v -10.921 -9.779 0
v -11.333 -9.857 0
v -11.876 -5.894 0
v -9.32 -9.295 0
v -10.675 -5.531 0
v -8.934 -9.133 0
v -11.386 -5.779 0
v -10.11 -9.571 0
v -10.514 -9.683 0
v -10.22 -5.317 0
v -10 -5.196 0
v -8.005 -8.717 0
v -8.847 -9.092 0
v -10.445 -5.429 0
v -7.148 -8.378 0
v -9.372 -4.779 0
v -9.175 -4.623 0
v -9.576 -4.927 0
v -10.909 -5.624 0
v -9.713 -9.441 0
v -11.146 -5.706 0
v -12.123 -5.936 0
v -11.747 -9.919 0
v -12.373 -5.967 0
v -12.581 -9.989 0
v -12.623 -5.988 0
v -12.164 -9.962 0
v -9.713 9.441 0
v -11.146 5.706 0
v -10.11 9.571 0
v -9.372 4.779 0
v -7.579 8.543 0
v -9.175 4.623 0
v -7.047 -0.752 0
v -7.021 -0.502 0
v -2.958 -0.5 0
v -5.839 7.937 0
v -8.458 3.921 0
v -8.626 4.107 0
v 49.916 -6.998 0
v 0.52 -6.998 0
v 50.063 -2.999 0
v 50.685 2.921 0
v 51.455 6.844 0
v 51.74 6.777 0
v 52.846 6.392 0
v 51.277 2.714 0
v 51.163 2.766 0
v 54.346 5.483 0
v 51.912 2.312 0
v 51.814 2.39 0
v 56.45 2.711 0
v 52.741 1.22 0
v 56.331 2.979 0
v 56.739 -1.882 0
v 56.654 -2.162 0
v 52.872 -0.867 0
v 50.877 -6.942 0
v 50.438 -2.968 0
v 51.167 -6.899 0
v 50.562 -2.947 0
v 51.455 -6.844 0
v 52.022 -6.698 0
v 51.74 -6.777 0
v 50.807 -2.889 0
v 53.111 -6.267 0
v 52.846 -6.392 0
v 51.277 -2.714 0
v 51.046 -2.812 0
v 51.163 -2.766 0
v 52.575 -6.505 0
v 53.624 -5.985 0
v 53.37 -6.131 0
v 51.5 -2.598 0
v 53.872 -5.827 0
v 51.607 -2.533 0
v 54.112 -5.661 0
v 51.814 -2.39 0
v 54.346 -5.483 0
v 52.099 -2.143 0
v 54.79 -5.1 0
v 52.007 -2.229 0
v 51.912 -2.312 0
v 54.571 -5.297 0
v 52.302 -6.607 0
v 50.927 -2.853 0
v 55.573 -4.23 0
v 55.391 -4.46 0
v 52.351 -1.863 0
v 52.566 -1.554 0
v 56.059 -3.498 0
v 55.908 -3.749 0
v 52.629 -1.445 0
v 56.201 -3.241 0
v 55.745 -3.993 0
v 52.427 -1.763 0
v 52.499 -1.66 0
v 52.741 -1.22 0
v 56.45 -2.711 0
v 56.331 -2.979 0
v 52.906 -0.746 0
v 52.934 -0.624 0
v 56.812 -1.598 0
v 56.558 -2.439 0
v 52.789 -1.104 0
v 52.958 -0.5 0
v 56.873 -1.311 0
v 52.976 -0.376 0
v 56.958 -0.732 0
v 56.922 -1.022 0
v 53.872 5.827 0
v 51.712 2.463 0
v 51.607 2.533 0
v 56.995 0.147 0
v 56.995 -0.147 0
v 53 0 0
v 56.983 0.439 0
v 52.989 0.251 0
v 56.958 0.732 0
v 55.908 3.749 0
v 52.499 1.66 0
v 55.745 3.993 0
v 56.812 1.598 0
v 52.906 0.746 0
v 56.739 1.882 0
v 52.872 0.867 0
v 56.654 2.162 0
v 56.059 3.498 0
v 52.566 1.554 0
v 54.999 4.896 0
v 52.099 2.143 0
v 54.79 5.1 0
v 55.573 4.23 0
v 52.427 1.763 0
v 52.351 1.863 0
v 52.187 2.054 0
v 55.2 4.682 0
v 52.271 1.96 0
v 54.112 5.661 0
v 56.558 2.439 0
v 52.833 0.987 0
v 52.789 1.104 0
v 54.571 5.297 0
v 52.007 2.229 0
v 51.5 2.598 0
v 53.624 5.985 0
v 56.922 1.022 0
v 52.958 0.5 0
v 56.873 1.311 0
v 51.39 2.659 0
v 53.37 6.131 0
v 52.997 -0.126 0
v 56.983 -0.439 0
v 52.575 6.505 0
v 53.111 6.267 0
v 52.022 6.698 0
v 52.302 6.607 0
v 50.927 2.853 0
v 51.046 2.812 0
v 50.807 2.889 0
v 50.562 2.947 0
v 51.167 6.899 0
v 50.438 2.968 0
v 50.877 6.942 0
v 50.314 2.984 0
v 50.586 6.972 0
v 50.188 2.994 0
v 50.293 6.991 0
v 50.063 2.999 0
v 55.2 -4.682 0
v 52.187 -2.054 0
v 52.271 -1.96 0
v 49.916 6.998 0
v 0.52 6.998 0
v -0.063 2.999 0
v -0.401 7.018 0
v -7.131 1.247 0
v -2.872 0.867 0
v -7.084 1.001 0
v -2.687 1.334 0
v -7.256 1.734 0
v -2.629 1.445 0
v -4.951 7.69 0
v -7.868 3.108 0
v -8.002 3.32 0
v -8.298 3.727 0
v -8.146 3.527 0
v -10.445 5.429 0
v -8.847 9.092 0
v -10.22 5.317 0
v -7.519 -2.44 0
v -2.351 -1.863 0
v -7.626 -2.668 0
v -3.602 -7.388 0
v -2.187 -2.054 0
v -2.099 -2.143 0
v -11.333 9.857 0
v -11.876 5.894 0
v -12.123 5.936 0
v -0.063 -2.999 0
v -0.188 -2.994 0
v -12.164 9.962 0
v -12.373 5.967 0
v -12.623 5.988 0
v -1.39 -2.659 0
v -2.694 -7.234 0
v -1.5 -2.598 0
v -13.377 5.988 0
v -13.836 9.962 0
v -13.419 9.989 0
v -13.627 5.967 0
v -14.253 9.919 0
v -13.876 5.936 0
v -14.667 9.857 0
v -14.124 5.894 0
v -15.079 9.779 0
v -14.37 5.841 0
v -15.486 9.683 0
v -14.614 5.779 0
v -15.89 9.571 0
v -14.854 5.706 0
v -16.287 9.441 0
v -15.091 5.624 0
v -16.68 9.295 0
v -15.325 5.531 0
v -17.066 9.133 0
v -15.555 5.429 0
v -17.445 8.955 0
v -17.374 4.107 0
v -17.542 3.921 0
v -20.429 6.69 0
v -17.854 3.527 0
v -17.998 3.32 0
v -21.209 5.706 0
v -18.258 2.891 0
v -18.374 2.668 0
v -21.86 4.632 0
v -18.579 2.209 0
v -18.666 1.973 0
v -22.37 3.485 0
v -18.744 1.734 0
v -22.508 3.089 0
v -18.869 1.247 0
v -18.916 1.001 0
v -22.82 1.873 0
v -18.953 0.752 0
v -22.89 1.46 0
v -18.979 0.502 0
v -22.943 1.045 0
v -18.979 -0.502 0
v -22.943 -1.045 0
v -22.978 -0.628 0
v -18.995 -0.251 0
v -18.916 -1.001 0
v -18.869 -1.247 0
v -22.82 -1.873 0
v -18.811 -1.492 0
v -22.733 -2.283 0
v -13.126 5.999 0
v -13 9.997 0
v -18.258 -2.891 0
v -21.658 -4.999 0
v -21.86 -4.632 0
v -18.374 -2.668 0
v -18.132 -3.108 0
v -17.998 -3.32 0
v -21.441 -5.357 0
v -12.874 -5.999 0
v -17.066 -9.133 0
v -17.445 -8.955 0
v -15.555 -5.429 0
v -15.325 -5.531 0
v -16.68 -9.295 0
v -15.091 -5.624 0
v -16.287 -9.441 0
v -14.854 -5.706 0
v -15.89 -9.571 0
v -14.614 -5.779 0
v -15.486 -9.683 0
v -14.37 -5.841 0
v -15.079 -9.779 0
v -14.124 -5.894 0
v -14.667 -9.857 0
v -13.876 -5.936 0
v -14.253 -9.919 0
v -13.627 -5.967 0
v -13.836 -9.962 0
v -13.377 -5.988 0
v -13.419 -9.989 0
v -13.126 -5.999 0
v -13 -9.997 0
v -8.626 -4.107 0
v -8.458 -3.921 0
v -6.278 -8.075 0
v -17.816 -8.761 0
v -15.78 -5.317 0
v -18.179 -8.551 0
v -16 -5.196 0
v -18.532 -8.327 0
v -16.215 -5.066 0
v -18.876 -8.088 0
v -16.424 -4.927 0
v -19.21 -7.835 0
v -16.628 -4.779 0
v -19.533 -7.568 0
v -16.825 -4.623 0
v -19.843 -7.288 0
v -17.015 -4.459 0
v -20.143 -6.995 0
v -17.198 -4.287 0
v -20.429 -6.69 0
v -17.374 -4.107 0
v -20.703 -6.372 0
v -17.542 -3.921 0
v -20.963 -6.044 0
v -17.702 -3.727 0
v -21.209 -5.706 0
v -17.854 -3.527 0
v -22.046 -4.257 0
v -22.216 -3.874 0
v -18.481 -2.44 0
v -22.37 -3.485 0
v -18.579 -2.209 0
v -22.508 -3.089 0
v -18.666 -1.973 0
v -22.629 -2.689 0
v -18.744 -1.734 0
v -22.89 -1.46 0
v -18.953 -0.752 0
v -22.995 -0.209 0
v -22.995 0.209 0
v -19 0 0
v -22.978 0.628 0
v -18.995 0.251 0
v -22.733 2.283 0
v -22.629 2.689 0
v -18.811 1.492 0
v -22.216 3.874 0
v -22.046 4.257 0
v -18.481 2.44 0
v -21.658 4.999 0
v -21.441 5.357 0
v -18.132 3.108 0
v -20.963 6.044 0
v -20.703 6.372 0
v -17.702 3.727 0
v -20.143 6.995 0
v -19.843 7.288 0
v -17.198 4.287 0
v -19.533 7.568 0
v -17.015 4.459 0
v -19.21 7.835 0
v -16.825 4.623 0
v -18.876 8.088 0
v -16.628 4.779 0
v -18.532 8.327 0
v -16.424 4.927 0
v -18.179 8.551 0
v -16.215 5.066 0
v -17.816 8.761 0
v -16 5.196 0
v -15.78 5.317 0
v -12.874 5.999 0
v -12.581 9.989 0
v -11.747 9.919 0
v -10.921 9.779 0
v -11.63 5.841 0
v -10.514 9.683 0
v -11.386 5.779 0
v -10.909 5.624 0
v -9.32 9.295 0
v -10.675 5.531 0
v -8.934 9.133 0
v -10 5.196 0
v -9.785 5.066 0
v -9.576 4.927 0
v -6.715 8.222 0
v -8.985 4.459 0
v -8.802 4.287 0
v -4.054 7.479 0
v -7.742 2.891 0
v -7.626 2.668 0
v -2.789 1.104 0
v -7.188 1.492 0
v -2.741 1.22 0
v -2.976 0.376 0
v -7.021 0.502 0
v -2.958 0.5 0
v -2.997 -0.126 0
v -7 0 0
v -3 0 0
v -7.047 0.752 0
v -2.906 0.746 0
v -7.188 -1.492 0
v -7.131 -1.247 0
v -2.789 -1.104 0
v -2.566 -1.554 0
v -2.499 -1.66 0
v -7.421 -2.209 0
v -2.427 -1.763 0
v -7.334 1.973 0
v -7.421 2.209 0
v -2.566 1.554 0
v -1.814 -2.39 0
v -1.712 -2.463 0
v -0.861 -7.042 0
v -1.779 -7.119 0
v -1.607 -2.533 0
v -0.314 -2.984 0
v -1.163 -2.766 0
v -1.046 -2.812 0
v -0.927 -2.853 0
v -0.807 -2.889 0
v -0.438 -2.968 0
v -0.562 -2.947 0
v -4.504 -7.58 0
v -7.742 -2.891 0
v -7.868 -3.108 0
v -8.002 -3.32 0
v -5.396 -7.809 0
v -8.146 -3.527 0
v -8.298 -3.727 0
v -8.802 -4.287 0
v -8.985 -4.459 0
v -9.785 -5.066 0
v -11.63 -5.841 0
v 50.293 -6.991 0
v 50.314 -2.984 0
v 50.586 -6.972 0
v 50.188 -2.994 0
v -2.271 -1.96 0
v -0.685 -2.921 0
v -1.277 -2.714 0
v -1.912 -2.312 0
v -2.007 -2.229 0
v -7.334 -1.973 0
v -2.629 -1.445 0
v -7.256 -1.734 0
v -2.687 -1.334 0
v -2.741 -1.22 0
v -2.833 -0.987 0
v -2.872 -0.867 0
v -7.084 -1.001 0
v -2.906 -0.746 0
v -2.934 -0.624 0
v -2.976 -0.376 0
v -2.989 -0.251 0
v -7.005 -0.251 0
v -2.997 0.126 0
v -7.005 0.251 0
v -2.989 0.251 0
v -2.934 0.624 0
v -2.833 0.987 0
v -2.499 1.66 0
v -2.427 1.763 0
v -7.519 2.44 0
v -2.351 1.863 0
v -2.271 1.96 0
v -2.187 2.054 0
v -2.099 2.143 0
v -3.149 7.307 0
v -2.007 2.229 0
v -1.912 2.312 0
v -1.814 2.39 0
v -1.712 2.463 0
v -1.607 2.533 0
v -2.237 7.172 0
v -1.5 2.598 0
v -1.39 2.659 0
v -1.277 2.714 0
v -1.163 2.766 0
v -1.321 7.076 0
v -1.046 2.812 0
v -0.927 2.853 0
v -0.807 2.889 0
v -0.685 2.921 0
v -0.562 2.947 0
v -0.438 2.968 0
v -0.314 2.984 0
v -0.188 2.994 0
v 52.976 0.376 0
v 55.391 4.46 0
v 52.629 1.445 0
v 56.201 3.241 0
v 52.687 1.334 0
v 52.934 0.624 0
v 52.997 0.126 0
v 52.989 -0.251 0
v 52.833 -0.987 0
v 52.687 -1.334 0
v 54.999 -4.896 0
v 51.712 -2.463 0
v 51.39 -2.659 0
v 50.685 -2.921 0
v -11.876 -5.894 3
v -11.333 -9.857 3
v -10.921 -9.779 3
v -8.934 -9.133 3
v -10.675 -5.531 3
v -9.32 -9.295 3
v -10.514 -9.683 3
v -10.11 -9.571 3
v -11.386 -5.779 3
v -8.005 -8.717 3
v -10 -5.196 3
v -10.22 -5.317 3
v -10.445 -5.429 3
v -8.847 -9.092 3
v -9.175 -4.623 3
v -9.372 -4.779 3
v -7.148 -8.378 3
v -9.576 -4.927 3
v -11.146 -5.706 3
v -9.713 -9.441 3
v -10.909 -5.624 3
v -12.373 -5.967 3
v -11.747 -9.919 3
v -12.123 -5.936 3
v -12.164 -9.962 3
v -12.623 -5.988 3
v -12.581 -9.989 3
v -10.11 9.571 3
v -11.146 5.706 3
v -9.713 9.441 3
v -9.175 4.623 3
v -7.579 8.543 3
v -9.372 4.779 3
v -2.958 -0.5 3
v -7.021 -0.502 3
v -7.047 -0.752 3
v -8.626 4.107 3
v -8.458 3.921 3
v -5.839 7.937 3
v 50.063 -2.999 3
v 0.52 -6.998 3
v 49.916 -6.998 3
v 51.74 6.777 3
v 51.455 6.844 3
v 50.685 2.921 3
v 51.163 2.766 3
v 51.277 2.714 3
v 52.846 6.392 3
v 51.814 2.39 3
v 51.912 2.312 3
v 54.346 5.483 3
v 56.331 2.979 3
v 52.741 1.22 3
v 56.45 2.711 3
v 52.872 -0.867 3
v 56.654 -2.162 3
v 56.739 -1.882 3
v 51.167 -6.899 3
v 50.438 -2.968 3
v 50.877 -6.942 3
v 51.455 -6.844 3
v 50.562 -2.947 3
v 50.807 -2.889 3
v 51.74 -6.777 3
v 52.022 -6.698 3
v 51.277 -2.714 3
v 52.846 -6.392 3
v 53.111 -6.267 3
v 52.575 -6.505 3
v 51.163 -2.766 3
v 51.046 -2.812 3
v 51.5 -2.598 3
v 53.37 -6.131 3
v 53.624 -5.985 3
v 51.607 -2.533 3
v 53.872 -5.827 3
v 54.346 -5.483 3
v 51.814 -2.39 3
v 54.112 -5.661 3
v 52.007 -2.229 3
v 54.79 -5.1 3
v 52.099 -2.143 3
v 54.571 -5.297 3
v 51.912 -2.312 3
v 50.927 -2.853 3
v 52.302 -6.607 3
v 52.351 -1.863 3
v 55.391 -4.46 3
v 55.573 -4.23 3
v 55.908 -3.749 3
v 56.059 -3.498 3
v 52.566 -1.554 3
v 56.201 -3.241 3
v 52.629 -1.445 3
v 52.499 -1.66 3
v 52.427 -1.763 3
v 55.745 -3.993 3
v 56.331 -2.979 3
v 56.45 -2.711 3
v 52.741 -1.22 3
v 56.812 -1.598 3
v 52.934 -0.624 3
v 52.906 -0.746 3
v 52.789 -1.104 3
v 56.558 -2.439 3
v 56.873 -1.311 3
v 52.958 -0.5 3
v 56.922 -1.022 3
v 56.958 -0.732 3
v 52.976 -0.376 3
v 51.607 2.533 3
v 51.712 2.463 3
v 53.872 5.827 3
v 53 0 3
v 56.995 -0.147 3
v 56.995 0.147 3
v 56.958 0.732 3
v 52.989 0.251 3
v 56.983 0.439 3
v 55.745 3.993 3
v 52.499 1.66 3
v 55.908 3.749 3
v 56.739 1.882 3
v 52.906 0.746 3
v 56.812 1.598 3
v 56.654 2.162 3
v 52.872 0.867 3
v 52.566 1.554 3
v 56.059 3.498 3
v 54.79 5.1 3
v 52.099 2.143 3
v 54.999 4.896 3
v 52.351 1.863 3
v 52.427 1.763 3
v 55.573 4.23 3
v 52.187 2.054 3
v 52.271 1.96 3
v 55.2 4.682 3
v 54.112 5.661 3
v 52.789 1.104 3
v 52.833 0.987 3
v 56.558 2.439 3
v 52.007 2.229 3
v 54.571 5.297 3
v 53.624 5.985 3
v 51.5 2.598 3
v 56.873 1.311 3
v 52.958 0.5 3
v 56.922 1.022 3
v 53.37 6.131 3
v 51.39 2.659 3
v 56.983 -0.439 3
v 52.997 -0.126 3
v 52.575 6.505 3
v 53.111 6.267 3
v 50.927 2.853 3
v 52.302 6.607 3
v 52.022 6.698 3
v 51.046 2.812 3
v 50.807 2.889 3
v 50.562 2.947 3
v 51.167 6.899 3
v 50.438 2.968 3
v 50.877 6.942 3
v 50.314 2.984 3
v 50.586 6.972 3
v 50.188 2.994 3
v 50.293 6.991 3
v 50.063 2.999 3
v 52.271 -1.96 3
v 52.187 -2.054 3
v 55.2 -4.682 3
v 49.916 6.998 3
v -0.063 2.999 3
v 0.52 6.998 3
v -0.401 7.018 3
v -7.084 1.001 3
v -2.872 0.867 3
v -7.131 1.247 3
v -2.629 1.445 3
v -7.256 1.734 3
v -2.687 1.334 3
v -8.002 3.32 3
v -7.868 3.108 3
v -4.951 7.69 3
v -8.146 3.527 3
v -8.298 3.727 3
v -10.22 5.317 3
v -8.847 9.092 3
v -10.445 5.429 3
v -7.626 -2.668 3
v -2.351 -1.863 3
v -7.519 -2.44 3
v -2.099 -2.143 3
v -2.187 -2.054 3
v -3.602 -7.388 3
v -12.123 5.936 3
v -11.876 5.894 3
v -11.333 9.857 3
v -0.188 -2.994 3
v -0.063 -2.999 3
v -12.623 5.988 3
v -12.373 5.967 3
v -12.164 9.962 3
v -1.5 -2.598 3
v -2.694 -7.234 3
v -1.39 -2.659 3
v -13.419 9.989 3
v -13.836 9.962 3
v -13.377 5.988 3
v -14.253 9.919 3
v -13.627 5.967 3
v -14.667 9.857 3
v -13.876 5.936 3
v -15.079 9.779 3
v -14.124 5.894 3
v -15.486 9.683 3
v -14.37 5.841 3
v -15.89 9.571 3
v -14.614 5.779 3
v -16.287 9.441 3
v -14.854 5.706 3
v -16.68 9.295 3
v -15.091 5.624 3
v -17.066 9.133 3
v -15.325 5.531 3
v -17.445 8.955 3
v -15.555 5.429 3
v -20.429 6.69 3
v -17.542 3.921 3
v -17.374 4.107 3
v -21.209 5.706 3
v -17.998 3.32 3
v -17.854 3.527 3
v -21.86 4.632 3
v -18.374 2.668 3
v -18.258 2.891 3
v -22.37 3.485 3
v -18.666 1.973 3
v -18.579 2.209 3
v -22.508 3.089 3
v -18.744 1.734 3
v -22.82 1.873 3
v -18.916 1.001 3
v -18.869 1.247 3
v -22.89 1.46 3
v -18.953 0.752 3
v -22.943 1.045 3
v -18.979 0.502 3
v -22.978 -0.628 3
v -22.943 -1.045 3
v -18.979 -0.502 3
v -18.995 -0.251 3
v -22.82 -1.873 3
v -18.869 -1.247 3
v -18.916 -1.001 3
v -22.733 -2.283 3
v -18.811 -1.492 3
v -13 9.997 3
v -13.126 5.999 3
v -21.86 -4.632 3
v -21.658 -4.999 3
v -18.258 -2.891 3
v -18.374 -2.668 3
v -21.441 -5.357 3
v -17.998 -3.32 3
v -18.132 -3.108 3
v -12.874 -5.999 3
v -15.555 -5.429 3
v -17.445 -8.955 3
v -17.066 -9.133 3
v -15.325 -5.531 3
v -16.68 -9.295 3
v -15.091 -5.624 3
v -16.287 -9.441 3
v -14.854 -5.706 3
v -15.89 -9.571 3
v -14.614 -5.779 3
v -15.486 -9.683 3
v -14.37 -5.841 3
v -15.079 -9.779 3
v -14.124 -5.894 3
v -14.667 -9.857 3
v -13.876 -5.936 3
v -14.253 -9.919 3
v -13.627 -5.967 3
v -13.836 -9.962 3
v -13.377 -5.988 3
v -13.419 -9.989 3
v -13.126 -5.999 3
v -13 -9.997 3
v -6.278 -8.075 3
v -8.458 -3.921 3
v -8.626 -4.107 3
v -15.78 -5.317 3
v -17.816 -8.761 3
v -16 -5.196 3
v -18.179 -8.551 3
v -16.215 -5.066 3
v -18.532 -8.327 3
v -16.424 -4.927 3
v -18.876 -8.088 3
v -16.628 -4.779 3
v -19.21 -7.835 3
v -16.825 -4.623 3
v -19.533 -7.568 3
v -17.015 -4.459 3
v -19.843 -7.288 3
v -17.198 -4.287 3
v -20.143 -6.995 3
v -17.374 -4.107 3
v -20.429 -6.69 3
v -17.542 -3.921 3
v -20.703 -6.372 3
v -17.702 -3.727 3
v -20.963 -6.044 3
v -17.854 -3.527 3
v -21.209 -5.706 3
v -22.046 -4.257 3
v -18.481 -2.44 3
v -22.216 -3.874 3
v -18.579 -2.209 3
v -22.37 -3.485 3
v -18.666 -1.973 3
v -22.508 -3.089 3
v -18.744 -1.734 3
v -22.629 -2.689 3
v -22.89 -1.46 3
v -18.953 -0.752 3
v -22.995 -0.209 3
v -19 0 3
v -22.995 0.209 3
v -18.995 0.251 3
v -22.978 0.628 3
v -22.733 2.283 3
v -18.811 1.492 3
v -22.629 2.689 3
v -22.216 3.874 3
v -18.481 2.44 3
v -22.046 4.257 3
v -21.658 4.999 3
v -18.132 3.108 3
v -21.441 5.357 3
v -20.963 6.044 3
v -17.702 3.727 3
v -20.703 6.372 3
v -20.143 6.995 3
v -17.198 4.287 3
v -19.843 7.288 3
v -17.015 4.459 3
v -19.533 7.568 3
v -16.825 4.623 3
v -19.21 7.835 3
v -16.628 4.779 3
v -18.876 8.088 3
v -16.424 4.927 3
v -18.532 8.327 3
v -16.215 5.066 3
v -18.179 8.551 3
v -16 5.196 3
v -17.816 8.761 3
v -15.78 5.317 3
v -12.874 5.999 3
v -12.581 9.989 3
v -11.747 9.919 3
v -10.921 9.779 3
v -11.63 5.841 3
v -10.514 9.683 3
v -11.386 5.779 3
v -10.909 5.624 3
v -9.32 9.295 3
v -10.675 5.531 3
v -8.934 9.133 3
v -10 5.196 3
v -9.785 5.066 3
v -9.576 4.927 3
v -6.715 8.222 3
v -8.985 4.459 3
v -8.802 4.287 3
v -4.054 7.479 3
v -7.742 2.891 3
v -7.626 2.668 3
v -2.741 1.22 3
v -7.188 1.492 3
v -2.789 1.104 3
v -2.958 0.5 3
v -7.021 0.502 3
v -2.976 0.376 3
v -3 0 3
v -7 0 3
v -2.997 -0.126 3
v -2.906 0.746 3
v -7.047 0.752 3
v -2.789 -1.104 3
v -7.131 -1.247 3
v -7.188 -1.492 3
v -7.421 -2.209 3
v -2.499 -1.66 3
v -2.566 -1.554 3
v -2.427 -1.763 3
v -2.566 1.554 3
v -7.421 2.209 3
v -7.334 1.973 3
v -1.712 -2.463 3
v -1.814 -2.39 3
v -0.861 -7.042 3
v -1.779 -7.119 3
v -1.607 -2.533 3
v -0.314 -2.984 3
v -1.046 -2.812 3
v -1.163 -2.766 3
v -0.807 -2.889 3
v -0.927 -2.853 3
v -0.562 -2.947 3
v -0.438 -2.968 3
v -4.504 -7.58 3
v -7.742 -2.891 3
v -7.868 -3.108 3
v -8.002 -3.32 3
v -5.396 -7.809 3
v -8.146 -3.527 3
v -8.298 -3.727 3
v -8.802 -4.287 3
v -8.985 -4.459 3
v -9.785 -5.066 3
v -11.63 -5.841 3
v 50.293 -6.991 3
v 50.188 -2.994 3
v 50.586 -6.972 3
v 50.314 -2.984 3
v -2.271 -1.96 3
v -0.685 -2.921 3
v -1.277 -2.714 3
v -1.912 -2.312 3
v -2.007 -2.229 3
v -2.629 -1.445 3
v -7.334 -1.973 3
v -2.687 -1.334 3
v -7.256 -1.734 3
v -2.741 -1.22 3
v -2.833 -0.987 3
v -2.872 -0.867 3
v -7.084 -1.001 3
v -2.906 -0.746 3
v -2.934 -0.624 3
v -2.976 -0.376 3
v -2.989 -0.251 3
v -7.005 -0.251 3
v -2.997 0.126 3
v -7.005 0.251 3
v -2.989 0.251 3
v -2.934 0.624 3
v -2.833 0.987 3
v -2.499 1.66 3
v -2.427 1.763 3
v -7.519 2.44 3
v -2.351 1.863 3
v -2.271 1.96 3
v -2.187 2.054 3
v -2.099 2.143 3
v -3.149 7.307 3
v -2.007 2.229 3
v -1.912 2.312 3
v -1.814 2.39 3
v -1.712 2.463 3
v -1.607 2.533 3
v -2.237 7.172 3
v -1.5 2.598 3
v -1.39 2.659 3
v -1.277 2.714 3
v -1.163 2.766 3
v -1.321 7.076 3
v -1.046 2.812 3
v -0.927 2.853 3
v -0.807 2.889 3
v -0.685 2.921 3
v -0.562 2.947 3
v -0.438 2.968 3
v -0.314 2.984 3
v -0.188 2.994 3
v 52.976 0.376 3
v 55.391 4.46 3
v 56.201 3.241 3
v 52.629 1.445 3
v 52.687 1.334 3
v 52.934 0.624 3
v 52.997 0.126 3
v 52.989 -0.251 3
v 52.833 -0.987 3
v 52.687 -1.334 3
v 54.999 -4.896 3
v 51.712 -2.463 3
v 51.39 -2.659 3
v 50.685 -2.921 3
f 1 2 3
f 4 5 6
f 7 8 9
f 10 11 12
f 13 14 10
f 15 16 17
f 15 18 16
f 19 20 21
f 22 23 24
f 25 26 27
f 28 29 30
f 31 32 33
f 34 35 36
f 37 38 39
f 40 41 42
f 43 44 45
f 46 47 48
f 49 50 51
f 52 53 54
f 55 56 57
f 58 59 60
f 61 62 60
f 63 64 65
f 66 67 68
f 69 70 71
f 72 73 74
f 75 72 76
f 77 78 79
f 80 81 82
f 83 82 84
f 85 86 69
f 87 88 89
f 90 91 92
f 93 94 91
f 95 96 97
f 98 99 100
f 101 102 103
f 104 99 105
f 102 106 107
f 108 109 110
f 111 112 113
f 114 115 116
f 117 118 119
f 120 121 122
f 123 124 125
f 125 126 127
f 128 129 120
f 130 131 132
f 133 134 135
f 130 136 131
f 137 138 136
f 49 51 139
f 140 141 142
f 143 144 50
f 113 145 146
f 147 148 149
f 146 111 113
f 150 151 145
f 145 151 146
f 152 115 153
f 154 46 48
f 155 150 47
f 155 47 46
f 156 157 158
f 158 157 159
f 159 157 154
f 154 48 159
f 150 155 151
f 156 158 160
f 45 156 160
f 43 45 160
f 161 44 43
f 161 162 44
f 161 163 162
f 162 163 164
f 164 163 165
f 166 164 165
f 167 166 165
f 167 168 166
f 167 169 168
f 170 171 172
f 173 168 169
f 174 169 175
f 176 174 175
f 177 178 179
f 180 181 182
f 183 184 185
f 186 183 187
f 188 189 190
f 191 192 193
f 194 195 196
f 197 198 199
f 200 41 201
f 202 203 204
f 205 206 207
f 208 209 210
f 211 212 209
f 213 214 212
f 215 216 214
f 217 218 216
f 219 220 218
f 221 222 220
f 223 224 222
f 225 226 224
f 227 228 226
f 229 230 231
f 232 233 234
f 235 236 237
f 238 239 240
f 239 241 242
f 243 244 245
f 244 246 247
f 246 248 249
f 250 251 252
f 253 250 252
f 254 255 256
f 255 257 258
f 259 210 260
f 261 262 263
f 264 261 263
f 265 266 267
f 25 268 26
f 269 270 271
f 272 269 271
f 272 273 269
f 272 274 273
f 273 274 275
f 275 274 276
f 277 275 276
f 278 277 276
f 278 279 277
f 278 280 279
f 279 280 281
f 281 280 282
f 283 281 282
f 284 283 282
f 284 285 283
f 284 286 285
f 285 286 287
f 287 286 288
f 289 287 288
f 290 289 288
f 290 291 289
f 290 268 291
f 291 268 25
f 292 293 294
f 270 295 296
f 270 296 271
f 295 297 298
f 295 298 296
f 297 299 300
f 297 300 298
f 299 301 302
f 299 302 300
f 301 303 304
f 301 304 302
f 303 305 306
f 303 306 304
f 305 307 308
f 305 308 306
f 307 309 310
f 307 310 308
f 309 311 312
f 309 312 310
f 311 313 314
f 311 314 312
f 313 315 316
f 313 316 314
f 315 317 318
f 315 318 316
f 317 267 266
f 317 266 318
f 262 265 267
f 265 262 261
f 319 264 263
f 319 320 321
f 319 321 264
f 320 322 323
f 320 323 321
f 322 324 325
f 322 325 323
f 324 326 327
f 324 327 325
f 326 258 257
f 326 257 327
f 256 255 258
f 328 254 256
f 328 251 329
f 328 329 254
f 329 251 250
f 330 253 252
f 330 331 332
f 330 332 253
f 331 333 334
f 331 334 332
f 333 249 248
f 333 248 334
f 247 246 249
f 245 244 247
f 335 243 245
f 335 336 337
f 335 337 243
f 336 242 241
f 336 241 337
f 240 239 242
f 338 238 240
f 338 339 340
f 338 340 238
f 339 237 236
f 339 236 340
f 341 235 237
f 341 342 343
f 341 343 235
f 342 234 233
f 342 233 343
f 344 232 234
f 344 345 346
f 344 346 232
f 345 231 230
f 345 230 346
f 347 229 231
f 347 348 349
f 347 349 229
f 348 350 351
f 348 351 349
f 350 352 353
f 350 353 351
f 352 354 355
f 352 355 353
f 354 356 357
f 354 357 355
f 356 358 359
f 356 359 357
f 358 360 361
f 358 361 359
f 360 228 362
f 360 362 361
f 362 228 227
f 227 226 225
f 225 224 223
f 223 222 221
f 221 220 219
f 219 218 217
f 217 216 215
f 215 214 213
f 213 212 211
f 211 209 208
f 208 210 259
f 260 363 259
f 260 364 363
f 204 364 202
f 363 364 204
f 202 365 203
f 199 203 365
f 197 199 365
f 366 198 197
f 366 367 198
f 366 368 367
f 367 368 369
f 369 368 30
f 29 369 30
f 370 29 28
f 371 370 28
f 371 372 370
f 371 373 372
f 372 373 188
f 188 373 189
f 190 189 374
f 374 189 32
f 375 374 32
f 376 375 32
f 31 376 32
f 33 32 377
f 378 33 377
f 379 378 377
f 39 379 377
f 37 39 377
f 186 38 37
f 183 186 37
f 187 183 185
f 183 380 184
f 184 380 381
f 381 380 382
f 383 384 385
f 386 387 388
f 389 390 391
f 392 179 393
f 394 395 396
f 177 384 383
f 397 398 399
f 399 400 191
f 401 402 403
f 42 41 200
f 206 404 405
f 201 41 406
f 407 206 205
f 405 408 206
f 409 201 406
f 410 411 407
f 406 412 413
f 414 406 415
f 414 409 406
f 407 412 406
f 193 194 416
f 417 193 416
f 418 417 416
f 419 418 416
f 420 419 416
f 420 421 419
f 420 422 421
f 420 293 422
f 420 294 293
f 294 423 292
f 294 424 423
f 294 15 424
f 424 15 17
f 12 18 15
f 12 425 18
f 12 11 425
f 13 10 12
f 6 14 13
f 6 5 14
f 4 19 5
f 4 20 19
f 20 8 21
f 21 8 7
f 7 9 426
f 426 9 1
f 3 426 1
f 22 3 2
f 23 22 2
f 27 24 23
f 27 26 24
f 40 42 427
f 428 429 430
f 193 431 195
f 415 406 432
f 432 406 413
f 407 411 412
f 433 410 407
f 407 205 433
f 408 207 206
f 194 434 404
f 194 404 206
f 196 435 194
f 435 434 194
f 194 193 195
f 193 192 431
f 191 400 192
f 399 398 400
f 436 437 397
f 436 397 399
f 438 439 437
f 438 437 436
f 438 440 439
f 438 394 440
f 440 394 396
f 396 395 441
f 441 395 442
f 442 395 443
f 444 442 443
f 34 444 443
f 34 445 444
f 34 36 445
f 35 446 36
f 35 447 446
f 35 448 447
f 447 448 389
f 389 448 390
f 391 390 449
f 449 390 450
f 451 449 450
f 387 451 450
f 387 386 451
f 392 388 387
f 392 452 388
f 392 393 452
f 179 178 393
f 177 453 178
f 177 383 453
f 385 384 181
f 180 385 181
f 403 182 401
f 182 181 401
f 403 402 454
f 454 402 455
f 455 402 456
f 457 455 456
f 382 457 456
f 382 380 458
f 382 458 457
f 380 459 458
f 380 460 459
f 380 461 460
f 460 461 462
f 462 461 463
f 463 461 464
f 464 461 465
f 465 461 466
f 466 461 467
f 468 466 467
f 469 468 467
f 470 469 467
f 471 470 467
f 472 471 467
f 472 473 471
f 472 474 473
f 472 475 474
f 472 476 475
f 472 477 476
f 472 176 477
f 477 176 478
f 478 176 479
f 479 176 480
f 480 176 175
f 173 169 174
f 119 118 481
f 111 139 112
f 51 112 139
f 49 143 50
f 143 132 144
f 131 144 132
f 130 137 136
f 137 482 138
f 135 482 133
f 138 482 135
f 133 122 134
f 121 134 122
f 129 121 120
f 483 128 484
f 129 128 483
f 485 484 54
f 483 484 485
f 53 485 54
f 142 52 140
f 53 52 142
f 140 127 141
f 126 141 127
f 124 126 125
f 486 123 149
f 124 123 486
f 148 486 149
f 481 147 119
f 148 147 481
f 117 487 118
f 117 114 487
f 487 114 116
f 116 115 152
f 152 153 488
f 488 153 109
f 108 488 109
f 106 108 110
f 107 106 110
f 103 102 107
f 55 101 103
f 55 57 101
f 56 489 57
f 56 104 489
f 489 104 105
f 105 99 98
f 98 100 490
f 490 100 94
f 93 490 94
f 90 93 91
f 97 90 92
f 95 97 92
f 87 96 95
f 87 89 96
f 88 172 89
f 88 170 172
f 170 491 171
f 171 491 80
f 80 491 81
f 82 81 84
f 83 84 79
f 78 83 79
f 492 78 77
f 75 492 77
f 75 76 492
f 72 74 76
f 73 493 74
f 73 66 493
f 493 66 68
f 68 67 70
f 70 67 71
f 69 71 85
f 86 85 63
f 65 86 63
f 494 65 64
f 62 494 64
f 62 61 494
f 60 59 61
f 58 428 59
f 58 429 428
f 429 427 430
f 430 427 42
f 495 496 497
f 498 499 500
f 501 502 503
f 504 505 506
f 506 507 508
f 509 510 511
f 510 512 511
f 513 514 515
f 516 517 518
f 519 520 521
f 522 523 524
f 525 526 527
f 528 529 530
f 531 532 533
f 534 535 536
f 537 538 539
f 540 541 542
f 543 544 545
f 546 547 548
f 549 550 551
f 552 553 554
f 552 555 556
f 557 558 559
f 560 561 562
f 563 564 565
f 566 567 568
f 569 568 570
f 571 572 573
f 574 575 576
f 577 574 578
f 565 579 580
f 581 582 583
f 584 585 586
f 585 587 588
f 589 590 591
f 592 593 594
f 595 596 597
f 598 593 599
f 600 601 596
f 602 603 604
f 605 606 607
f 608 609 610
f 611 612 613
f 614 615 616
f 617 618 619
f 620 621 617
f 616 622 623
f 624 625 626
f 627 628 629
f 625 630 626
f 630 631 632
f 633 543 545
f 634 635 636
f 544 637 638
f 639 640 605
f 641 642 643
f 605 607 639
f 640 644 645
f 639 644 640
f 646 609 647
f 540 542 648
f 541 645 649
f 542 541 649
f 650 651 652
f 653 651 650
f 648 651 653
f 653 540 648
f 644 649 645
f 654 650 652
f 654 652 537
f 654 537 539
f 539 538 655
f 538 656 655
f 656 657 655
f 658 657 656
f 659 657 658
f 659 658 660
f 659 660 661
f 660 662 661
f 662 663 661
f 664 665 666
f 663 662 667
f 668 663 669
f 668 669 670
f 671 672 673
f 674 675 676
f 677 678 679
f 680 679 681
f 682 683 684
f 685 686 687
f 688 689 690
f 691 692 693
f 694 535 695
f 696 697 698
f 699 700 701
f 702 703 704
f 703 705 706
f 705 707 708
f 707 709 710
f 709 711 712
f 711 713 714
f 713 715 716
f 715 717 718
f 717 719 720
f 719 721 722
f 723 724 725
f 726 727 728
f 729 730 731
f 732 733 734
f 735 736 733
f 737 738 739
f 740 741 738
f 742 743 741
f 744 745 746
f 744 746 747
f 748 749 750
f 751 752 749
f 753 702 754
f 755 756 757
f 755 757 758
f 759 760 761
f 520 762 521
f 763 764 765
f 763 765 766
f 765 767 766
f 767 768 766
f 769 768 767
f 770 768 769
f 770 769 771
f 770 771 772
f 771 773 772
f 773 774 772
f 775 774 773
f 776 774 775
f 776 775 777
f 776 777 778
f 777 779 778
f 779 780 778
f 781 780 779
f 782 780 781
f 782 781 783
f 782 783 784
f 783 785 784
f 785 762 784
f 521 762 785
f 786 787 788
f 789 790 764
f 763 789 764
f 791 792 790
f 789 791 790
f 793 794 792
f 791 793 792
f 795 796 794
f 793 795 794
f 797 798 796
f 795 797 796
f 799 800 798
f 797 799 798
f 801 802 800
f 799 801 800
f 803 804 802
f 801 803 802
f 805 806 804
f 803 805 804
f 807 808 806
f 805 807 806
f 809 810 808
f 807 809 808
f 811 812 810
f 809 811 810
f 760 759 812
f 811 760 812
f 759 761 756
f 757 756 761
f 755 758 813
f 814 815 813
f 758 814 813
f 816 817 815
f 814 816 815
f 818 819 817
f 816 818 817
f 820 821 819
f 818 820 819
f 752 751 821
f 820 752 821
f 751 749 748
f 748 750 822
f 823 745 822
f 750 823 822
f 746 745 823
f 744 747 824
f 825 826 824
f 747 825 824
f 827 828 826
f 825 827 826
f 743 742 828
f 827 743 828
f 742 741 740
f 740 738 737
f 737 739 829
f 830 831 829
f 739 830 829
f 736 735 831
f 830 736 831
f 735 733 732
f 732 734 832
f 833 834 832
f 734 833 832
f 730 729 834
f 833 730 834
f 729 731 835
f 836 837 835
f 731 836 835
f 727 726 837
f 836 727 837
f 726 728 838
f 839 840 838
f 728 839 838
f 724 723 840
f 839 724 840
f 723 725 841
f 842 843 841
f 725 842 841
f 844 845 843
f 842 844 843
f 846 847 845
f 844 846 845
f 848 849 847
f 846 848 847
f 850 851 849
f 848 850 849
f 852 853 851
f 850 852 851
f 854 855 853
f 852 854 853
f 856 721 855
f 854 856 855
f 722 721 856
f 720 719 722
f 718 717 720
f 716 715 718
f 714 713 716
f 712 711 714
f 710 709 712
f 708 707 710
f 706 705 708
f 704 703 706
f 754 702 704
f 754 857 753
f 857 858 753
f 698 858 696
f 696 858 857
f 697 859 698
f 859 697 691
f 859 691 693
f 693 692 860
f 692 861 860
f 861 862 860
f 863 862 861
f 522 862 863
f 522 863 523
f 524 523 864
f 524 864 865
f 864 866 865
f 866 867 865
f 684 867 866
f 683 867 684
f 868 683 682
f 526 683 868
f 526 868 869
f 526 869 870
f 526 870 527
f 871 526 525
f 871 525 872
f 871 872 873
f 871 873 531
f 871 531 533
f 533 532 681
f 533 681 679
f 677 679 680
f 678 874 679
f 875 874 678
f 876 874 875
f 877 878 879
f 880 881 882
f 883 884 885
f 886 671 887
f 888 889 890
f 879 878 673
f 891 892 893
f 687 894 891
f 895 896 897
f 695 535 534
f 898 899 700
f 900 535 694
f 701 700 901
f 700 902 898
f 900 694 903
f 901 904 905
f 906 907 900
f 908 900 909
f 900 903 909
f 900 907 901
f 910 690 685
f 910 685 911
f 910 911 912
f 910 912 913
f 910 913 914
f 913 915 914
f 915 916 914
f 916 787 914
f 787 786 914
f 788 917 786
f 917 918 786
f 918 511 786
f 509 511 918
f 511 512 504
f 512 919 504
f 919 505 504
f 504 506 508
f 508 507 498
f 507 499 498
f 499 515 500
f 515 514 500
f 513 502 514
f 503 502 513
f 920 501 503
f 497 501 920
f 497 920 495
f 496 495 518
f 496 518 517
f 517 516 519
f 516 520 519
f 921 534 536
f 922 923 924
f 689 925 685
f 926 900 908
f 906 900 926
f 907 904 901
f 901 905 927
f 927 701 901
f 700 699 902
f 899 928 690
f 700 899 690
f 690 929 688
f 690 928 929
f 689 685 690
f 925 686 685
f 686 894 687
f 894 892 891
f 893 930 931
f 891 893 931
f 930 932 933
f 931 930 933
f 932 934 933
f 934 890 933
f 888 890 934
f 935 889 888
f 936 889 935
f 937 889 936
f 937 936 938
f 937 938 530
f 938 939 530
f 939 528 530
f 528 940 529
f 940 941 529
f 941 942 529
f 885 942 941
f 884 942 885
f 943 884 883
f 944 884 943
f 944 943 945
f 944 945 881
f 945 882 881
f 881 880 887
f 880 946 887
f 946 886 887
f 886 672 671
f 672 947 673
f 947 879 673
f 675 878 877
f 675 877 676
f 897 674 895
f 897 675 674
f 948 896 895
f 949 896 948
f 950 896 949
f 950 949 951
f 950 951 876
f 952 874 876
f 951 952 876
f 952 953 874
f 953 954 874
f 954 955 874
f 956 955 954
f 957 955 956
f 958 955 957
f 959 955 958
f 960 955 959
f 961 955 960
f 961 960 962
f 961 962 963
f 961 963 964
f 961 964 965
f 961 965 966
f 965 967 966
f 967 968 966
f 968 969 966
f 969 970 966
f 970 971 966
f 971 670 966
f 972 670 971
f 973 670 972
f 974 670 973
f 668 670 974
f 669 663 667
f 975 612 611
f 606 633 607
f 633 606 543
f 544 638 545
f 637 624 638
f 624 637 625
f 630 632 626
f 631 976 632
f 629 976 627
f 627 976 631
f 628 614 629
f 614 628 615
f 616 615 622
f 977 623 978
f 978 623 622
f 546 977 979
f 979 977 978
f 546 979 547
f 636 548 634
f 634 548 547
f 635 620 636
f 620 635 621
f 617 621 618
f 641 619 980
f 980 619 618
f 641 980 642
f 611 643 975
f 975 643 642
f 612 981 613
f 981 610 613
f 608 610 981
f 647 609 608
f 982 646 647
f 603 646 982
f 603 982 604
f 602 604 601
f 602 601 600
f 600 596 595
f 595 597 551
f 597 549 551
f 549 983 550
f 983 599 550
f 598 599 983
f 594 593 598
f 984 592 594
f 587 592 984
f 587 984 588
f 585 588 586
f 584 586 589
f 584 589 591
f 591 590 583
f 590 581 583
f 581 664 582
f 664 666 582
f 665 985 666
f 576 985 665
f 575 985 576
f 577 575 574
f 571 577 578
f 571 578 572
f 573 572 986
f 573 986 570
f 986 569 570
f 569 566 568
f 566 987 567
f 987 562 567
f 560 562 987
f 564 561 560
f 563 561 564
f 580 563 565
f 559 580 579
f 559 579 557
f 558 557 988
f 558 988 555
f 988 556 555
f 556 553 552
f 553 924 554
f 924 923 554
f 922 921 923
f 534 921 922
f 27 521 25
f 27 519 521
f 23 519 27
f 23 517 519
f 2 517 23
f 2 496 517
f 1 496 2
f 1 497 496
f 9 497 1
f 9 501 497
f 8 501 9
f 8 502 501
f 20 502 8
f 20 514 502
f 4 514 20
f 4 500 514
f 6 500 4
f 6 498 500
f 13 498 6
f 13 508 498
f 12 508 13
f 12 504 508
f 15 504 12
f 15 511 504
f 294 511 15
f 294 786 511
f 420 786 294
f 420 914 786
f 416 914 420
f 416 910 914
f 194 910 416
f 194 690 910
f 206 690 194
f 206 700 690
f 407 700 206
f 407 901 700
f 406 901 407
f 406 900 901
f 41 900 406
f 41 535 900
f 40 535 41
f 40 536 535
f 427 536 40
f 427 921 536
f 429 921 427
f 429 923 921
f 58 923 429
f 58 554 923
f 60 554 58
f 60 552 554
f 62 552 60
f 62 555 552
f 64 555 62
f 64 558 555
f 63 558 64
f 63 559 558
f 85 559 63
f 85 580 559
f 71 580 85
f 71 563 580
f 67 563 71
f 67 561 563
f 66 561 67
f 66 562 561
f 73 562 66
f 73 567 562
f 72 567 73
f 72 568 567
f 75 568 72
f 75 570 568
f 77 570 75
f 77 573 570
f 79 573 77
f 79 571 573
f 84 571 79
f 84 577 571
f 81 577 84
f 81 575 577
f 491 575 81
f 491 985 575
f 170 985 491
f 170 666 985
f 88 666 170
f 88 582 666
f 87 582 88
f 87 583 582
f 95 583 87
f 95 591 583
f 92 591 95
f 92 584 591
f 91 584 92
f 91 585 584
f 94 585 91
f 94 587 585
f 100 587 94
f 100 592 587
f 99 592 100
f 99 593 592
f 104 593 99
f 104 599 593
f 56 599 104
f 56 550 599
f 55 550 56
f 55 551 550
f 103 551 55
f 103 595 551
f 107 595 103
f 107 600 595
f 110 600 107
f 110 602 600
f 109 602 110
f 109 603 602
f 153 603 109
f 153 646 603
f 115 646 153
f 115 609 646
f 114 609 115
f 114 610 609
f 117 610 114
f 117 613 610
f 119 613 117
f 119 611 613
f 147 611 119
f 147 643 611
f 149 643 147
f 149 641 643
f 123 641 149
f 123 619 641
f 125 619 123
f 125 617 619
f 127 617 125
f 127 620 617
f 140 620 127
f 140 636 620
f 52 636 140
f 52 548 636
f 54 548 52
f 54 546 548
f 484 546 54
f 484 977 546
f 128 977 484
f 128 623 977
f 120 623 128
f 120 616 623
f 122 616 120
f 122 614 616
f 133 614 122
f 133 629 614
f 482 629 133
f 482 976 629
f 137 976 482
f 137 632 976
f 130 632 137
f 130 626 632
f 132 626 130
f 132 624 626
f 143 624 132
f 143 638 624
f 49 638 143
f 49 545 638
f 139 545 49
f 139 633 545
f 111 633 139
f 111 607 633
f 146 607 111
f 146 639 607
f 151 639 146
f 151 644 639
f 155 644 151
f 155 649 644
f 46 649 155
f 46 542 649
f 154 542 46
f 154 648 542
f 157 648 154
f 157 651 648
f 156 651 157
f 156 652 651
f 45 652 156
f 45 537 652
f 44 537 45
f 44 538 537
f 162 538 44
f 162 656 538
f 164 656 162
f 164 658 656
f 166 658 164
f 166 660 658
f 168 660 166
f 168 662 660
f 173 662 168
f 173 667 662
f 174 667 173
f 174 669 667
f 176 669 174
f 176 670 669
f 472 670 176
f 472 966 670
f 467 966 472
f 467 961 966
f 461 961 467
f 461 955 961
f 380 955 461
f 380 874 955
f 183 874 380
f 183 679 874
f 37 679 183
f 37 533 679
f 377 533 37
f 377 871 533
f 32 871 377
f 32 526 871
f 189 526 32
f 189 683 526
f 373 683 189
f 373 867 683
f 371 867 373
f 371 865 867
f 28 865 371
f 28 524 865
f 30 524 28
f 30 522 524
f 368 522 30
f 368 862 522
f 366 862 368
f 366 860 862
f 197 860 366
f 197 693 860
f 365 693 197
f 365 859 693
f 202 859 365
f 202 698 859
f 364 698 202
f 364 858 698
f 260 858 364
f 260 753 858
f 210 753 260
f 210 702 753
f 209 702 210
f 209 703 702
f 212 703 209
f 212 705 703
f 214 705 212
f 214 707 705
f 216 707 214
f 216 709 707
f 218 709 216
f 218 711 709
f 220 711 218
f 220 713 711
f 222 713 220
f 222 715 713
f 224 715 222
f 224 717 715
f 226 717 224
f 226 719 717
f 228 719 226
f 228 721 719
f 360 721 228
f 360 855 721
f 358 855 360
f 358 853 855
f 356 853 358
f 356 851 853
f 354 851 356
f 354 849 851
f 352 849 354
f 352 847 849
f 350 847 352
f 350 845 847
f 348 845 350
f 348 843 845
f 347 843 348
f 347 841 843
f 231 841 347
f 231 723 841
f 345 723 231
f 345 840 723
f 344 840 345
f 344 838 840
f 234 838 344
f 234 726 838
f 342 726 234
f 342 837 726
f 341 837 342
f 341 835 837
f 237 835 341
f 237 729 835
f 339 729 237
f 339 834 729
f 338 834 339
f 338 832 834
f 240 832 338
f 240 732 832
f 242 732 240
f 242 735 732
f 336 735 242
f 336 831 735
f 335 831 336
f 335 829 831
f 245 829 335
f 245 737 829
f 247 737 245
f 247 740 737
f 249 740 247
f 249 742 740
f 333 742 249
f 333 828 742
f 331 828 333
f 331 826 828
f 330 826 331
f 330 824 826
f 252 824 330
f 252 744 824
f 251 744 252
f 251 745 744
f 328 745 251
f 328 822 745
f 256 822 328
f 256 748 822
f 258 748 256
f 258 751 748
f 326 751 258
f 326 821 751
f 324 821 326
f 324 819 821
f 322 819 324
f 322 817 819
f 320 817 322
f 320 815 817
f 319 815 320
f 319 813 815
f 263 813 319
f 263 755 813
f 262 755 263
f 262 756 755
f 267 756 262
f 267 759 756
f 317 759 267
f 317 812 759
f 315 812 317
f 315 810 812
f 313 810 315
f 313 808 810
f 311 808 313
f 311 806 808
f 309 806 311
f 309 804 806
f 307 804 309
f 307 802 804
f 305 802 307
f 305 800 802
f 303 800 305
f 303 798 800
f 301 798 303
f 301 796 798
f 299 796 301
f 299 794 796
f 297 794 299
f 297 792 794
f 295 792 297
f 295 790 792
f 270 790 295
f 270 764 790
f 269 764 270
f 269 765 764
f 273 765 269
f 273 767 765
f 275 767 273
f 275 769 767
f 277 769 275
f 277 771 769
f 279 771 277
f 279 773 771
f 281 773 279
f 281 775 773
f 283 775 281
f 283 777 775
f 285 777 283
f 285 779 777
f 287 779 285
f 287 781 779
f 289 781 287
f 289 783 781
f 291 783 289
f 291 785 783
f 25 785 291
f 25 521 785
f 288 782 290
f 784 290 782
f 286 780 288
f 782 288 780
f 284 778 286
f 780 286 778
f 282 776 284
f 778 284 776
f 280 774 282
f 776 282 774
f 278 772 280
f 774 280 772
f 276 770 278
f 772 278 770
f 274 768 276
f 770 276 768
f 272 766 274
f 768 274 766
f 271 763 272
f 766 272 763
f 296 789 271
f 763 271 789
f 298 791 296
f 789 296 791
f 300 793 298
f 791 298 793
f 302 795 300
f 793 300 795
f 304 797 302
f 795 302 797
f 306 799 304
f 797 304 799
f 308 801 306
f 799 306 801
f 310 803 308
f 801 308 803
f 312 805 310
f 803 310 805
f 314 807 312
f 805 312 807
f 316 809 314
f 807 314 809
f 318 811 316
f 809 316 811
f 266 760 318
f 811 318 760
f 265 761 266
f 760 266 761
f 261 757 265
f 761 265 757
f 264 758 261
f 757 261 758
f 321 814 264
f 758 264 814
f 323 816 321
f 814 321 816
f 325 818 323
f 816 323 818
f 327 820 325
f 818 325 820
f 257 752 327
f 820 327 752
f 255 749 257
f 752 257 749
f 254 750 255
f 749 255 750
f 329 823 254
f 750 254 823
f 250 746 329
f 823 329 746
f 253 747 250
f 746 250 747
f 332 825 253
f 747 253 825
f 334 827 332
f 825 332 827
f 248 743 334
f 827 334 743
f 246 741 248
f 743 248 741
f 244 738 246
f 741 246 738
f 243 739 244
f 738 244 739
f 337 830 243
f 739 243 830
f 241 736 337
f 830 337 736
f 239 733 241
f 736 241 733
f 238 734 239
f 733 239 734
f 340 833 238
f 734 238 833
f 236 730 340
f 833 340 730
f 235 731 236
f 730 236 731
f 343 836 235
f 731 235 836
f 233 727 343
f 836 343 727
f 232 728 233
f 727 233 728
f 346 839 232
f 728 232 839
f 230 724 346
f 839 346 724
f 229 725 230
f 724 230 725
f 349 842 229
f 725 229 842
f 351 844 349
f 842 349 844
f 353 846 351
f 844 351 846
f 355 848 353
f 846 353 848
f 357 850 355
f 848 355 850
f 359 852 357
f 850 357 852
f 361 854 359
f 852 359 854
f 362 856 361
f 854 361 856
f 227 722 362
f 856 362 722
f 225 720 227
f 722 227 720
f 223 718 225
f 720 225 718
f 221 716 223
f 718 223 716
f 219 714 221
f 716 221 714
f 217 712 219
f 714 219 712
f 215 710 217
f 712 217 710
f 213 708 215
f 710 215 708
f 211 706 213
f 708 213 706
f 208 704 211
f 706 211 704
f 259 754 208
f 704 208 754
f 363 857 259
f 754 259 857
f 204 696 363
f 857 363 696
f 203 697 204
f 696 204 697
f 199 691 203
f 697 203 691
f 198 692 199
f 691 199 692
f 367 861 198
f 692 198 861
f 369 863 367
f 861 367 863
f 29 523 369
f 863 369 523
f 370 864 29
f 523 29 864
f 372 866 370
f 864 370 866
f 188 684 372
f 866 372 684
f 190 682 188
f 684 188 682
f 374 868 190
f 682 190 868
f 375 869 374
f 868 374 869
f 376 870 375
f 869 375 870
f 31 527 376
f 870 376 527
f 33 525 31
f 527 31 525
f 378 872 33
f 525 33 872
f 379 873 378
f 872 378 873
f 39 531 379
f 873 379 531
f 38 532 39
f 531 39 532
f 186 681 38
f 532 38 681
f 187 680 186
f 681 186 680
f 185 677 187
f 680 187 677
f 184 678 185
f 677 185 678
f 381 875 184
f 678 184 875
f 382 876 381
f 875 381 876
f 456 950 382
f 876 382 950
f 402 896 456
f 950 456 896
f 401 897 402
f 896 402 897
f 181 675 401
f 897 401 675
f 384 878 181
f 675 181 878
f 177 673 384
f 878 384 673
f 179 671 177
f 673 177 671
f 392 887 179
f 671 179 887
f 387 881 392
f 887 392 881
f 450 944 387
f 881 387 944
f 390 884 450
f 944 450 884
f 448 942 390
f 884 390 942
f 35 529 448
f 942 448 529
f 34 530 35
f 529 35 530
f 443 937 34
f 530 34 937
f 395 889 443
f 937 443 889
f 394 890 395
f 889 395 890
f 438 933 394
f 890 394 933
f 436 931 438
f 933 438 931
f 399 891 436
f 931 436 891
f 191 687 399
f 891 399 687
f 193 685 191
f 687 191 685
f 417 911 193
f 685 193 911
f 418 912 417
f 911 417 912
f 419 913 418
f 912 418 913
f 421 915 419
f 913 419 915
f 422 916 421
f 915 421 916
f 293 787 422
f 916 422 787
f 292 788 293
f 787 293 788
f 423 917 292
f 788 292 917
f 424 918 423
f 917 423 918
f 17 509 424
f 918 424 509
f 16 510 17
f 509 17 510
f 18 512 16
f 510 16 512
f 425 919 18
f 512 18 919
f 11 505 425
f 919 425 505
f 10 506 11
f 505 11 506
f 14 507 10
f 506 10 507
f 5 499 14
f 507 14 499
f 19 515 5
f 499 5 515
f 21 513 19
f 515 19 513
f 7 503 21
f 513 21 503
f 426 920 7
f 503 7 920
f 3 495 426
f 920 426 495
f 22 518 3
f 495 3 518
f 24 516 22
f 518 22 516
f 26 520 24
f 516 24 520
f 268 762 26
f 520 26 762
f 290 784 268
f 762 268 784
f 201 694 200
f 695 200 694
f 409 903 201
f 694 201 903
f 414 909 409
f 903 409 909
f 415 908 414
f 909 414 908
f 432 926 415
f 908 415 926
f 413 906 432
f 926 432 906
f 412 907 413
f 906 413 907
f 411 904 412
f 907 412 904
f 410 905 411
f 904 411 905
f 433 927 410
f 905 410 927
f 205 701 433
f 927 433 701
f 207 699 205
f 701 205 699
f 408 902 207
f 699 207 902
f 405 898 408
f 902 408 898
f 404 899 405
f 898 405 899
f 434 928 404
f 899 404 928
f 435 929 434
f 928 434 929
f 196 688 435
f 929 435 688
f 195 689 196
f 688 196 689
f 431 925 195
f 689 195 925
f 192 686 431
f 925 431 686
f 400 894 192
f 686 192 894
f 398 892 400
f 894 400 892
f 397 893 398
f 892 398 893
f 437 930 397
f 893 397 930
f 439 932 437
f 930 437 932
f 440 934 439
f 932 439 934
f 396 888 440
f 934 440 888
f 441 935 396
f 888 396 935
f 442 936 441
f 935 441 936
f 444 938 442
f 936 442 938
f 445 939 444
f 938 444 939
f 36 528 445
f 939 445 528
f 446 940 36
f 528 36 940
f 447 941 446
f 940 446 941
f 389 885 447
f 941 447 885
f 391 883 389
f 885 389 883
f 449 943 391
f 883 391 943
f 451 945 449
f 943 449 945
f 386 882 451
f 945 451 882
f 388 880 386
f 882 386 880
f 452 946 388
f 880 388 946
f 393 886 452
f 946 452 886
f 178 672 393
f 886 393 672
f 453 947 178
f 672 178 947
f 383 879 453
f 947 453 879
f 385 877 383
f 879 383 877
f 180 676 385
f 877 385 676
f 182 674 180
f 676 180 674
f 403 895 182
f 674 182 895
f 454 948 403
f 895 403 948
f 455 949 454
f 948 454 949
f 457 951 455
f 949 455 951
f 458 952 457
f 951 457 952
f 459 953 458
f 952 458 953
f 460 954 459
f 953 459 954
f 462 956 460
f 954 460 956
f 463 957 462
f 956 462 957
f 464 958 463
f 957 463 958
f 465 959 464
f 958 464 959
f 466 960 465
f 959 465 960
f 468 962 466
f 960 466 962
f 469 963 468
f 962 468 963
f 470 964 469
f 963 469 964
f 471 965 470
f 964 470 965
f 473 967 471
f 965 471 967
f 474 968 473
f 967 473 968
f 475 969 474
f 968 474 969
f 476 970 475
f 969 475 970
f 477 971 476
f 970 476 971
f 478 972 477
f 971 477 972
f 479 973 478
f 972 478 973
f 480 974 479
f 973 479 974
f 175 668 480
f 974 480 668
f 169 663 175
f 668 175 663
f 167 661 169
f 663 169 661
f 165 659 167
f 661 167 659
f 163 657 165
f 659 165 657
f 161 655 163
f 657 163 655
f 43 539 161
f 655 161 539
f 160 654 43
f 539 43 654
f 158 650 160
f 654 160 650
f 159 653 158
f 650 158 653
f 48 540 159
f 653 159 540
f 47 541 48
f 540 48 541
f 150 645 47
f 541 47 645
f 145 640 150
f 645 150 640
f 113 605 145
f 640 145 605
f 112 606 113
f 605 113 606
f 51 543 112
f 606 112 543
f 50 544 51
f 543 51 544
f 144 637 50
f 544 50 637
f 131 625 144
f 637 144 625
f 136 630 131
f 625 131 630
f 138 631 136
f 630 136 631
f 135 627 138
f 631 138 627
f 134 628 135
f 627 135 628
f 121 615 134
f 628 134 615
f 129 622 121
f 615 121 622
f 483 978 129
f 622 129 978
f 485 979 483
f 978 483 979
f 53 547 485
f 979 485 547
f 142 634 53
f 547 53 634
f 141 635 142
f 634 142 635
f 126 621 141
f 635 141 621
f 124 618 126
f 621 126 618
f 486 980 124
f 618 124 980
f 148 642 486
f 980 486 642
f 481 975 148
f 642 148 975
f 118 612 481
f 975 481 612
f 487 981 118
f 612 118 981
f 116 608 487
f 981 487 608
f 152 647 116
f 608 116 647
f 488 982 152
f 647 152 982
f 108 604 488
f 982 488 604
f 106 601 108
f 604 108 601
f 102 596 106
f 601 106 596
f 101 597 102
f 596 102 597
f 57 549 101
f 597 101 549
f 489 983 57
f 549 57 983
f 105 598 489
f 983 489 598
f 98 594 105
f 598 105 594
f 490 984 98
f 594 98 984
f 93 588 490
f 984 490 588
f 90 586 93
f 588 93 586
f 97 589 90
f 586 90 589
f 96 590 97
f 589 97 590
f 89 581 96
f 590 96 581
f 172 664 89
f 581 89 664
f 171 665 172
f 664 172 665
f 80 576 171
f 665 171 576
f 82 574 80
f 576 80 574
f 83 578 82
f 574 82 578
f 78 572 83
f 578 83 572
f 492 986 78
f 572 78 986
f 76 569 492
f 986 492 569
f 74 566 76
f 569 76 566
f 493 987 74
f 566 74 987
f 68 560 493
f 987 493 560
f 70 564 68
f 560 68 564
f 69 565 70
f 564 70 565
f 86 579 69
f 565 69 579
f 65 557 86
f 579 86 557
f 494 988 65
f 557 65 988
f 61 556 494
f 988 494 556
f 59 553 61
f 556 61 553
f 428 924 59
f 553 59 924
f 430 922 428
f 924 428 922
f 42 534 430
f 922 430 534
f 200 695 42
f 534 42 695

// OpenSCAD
slot_length=50;
slot_width=6;
pivot_diameter=12;
wall_thickness=4;
linkage_height=3;


module outter_profile (){
round2d(OR=0,IR=pivot_diameter+slot_width+wall_thickness){
translate([-(pivot_diameter+(wall_thickness*2))/2-slot_width/2,0,0]) circle((pivot_diameter+(wall_thickness*2))/2);
hull(){
translate([0,0,0]) circle((slot_width+(wall_thickness*2))/2);
translate([slot_length,0,0]) circle((slot_width+(wall_thickness*2))/2);
}
}
}

$fn=150;
   
module inner_profile (){    
translate([-(pivot_diameter+(wall_thickness*2))/2-slot_width/2,0,0]) circle(pivot_diameter/2);
hull(){
translate([0,0,0]) circle(slot_width/2);
translate([slot_length,0,0]) circle(slot_width/2);
}
}


module round2d(OR=3,IR=1){
    offset(OR)offset(-IR-OR)offset(IR)children();
}

module all(){
difference(){
 outter_profile ();   
  inner_profile ();  
}
}

linear_extrude(height=linkage_height) all();
